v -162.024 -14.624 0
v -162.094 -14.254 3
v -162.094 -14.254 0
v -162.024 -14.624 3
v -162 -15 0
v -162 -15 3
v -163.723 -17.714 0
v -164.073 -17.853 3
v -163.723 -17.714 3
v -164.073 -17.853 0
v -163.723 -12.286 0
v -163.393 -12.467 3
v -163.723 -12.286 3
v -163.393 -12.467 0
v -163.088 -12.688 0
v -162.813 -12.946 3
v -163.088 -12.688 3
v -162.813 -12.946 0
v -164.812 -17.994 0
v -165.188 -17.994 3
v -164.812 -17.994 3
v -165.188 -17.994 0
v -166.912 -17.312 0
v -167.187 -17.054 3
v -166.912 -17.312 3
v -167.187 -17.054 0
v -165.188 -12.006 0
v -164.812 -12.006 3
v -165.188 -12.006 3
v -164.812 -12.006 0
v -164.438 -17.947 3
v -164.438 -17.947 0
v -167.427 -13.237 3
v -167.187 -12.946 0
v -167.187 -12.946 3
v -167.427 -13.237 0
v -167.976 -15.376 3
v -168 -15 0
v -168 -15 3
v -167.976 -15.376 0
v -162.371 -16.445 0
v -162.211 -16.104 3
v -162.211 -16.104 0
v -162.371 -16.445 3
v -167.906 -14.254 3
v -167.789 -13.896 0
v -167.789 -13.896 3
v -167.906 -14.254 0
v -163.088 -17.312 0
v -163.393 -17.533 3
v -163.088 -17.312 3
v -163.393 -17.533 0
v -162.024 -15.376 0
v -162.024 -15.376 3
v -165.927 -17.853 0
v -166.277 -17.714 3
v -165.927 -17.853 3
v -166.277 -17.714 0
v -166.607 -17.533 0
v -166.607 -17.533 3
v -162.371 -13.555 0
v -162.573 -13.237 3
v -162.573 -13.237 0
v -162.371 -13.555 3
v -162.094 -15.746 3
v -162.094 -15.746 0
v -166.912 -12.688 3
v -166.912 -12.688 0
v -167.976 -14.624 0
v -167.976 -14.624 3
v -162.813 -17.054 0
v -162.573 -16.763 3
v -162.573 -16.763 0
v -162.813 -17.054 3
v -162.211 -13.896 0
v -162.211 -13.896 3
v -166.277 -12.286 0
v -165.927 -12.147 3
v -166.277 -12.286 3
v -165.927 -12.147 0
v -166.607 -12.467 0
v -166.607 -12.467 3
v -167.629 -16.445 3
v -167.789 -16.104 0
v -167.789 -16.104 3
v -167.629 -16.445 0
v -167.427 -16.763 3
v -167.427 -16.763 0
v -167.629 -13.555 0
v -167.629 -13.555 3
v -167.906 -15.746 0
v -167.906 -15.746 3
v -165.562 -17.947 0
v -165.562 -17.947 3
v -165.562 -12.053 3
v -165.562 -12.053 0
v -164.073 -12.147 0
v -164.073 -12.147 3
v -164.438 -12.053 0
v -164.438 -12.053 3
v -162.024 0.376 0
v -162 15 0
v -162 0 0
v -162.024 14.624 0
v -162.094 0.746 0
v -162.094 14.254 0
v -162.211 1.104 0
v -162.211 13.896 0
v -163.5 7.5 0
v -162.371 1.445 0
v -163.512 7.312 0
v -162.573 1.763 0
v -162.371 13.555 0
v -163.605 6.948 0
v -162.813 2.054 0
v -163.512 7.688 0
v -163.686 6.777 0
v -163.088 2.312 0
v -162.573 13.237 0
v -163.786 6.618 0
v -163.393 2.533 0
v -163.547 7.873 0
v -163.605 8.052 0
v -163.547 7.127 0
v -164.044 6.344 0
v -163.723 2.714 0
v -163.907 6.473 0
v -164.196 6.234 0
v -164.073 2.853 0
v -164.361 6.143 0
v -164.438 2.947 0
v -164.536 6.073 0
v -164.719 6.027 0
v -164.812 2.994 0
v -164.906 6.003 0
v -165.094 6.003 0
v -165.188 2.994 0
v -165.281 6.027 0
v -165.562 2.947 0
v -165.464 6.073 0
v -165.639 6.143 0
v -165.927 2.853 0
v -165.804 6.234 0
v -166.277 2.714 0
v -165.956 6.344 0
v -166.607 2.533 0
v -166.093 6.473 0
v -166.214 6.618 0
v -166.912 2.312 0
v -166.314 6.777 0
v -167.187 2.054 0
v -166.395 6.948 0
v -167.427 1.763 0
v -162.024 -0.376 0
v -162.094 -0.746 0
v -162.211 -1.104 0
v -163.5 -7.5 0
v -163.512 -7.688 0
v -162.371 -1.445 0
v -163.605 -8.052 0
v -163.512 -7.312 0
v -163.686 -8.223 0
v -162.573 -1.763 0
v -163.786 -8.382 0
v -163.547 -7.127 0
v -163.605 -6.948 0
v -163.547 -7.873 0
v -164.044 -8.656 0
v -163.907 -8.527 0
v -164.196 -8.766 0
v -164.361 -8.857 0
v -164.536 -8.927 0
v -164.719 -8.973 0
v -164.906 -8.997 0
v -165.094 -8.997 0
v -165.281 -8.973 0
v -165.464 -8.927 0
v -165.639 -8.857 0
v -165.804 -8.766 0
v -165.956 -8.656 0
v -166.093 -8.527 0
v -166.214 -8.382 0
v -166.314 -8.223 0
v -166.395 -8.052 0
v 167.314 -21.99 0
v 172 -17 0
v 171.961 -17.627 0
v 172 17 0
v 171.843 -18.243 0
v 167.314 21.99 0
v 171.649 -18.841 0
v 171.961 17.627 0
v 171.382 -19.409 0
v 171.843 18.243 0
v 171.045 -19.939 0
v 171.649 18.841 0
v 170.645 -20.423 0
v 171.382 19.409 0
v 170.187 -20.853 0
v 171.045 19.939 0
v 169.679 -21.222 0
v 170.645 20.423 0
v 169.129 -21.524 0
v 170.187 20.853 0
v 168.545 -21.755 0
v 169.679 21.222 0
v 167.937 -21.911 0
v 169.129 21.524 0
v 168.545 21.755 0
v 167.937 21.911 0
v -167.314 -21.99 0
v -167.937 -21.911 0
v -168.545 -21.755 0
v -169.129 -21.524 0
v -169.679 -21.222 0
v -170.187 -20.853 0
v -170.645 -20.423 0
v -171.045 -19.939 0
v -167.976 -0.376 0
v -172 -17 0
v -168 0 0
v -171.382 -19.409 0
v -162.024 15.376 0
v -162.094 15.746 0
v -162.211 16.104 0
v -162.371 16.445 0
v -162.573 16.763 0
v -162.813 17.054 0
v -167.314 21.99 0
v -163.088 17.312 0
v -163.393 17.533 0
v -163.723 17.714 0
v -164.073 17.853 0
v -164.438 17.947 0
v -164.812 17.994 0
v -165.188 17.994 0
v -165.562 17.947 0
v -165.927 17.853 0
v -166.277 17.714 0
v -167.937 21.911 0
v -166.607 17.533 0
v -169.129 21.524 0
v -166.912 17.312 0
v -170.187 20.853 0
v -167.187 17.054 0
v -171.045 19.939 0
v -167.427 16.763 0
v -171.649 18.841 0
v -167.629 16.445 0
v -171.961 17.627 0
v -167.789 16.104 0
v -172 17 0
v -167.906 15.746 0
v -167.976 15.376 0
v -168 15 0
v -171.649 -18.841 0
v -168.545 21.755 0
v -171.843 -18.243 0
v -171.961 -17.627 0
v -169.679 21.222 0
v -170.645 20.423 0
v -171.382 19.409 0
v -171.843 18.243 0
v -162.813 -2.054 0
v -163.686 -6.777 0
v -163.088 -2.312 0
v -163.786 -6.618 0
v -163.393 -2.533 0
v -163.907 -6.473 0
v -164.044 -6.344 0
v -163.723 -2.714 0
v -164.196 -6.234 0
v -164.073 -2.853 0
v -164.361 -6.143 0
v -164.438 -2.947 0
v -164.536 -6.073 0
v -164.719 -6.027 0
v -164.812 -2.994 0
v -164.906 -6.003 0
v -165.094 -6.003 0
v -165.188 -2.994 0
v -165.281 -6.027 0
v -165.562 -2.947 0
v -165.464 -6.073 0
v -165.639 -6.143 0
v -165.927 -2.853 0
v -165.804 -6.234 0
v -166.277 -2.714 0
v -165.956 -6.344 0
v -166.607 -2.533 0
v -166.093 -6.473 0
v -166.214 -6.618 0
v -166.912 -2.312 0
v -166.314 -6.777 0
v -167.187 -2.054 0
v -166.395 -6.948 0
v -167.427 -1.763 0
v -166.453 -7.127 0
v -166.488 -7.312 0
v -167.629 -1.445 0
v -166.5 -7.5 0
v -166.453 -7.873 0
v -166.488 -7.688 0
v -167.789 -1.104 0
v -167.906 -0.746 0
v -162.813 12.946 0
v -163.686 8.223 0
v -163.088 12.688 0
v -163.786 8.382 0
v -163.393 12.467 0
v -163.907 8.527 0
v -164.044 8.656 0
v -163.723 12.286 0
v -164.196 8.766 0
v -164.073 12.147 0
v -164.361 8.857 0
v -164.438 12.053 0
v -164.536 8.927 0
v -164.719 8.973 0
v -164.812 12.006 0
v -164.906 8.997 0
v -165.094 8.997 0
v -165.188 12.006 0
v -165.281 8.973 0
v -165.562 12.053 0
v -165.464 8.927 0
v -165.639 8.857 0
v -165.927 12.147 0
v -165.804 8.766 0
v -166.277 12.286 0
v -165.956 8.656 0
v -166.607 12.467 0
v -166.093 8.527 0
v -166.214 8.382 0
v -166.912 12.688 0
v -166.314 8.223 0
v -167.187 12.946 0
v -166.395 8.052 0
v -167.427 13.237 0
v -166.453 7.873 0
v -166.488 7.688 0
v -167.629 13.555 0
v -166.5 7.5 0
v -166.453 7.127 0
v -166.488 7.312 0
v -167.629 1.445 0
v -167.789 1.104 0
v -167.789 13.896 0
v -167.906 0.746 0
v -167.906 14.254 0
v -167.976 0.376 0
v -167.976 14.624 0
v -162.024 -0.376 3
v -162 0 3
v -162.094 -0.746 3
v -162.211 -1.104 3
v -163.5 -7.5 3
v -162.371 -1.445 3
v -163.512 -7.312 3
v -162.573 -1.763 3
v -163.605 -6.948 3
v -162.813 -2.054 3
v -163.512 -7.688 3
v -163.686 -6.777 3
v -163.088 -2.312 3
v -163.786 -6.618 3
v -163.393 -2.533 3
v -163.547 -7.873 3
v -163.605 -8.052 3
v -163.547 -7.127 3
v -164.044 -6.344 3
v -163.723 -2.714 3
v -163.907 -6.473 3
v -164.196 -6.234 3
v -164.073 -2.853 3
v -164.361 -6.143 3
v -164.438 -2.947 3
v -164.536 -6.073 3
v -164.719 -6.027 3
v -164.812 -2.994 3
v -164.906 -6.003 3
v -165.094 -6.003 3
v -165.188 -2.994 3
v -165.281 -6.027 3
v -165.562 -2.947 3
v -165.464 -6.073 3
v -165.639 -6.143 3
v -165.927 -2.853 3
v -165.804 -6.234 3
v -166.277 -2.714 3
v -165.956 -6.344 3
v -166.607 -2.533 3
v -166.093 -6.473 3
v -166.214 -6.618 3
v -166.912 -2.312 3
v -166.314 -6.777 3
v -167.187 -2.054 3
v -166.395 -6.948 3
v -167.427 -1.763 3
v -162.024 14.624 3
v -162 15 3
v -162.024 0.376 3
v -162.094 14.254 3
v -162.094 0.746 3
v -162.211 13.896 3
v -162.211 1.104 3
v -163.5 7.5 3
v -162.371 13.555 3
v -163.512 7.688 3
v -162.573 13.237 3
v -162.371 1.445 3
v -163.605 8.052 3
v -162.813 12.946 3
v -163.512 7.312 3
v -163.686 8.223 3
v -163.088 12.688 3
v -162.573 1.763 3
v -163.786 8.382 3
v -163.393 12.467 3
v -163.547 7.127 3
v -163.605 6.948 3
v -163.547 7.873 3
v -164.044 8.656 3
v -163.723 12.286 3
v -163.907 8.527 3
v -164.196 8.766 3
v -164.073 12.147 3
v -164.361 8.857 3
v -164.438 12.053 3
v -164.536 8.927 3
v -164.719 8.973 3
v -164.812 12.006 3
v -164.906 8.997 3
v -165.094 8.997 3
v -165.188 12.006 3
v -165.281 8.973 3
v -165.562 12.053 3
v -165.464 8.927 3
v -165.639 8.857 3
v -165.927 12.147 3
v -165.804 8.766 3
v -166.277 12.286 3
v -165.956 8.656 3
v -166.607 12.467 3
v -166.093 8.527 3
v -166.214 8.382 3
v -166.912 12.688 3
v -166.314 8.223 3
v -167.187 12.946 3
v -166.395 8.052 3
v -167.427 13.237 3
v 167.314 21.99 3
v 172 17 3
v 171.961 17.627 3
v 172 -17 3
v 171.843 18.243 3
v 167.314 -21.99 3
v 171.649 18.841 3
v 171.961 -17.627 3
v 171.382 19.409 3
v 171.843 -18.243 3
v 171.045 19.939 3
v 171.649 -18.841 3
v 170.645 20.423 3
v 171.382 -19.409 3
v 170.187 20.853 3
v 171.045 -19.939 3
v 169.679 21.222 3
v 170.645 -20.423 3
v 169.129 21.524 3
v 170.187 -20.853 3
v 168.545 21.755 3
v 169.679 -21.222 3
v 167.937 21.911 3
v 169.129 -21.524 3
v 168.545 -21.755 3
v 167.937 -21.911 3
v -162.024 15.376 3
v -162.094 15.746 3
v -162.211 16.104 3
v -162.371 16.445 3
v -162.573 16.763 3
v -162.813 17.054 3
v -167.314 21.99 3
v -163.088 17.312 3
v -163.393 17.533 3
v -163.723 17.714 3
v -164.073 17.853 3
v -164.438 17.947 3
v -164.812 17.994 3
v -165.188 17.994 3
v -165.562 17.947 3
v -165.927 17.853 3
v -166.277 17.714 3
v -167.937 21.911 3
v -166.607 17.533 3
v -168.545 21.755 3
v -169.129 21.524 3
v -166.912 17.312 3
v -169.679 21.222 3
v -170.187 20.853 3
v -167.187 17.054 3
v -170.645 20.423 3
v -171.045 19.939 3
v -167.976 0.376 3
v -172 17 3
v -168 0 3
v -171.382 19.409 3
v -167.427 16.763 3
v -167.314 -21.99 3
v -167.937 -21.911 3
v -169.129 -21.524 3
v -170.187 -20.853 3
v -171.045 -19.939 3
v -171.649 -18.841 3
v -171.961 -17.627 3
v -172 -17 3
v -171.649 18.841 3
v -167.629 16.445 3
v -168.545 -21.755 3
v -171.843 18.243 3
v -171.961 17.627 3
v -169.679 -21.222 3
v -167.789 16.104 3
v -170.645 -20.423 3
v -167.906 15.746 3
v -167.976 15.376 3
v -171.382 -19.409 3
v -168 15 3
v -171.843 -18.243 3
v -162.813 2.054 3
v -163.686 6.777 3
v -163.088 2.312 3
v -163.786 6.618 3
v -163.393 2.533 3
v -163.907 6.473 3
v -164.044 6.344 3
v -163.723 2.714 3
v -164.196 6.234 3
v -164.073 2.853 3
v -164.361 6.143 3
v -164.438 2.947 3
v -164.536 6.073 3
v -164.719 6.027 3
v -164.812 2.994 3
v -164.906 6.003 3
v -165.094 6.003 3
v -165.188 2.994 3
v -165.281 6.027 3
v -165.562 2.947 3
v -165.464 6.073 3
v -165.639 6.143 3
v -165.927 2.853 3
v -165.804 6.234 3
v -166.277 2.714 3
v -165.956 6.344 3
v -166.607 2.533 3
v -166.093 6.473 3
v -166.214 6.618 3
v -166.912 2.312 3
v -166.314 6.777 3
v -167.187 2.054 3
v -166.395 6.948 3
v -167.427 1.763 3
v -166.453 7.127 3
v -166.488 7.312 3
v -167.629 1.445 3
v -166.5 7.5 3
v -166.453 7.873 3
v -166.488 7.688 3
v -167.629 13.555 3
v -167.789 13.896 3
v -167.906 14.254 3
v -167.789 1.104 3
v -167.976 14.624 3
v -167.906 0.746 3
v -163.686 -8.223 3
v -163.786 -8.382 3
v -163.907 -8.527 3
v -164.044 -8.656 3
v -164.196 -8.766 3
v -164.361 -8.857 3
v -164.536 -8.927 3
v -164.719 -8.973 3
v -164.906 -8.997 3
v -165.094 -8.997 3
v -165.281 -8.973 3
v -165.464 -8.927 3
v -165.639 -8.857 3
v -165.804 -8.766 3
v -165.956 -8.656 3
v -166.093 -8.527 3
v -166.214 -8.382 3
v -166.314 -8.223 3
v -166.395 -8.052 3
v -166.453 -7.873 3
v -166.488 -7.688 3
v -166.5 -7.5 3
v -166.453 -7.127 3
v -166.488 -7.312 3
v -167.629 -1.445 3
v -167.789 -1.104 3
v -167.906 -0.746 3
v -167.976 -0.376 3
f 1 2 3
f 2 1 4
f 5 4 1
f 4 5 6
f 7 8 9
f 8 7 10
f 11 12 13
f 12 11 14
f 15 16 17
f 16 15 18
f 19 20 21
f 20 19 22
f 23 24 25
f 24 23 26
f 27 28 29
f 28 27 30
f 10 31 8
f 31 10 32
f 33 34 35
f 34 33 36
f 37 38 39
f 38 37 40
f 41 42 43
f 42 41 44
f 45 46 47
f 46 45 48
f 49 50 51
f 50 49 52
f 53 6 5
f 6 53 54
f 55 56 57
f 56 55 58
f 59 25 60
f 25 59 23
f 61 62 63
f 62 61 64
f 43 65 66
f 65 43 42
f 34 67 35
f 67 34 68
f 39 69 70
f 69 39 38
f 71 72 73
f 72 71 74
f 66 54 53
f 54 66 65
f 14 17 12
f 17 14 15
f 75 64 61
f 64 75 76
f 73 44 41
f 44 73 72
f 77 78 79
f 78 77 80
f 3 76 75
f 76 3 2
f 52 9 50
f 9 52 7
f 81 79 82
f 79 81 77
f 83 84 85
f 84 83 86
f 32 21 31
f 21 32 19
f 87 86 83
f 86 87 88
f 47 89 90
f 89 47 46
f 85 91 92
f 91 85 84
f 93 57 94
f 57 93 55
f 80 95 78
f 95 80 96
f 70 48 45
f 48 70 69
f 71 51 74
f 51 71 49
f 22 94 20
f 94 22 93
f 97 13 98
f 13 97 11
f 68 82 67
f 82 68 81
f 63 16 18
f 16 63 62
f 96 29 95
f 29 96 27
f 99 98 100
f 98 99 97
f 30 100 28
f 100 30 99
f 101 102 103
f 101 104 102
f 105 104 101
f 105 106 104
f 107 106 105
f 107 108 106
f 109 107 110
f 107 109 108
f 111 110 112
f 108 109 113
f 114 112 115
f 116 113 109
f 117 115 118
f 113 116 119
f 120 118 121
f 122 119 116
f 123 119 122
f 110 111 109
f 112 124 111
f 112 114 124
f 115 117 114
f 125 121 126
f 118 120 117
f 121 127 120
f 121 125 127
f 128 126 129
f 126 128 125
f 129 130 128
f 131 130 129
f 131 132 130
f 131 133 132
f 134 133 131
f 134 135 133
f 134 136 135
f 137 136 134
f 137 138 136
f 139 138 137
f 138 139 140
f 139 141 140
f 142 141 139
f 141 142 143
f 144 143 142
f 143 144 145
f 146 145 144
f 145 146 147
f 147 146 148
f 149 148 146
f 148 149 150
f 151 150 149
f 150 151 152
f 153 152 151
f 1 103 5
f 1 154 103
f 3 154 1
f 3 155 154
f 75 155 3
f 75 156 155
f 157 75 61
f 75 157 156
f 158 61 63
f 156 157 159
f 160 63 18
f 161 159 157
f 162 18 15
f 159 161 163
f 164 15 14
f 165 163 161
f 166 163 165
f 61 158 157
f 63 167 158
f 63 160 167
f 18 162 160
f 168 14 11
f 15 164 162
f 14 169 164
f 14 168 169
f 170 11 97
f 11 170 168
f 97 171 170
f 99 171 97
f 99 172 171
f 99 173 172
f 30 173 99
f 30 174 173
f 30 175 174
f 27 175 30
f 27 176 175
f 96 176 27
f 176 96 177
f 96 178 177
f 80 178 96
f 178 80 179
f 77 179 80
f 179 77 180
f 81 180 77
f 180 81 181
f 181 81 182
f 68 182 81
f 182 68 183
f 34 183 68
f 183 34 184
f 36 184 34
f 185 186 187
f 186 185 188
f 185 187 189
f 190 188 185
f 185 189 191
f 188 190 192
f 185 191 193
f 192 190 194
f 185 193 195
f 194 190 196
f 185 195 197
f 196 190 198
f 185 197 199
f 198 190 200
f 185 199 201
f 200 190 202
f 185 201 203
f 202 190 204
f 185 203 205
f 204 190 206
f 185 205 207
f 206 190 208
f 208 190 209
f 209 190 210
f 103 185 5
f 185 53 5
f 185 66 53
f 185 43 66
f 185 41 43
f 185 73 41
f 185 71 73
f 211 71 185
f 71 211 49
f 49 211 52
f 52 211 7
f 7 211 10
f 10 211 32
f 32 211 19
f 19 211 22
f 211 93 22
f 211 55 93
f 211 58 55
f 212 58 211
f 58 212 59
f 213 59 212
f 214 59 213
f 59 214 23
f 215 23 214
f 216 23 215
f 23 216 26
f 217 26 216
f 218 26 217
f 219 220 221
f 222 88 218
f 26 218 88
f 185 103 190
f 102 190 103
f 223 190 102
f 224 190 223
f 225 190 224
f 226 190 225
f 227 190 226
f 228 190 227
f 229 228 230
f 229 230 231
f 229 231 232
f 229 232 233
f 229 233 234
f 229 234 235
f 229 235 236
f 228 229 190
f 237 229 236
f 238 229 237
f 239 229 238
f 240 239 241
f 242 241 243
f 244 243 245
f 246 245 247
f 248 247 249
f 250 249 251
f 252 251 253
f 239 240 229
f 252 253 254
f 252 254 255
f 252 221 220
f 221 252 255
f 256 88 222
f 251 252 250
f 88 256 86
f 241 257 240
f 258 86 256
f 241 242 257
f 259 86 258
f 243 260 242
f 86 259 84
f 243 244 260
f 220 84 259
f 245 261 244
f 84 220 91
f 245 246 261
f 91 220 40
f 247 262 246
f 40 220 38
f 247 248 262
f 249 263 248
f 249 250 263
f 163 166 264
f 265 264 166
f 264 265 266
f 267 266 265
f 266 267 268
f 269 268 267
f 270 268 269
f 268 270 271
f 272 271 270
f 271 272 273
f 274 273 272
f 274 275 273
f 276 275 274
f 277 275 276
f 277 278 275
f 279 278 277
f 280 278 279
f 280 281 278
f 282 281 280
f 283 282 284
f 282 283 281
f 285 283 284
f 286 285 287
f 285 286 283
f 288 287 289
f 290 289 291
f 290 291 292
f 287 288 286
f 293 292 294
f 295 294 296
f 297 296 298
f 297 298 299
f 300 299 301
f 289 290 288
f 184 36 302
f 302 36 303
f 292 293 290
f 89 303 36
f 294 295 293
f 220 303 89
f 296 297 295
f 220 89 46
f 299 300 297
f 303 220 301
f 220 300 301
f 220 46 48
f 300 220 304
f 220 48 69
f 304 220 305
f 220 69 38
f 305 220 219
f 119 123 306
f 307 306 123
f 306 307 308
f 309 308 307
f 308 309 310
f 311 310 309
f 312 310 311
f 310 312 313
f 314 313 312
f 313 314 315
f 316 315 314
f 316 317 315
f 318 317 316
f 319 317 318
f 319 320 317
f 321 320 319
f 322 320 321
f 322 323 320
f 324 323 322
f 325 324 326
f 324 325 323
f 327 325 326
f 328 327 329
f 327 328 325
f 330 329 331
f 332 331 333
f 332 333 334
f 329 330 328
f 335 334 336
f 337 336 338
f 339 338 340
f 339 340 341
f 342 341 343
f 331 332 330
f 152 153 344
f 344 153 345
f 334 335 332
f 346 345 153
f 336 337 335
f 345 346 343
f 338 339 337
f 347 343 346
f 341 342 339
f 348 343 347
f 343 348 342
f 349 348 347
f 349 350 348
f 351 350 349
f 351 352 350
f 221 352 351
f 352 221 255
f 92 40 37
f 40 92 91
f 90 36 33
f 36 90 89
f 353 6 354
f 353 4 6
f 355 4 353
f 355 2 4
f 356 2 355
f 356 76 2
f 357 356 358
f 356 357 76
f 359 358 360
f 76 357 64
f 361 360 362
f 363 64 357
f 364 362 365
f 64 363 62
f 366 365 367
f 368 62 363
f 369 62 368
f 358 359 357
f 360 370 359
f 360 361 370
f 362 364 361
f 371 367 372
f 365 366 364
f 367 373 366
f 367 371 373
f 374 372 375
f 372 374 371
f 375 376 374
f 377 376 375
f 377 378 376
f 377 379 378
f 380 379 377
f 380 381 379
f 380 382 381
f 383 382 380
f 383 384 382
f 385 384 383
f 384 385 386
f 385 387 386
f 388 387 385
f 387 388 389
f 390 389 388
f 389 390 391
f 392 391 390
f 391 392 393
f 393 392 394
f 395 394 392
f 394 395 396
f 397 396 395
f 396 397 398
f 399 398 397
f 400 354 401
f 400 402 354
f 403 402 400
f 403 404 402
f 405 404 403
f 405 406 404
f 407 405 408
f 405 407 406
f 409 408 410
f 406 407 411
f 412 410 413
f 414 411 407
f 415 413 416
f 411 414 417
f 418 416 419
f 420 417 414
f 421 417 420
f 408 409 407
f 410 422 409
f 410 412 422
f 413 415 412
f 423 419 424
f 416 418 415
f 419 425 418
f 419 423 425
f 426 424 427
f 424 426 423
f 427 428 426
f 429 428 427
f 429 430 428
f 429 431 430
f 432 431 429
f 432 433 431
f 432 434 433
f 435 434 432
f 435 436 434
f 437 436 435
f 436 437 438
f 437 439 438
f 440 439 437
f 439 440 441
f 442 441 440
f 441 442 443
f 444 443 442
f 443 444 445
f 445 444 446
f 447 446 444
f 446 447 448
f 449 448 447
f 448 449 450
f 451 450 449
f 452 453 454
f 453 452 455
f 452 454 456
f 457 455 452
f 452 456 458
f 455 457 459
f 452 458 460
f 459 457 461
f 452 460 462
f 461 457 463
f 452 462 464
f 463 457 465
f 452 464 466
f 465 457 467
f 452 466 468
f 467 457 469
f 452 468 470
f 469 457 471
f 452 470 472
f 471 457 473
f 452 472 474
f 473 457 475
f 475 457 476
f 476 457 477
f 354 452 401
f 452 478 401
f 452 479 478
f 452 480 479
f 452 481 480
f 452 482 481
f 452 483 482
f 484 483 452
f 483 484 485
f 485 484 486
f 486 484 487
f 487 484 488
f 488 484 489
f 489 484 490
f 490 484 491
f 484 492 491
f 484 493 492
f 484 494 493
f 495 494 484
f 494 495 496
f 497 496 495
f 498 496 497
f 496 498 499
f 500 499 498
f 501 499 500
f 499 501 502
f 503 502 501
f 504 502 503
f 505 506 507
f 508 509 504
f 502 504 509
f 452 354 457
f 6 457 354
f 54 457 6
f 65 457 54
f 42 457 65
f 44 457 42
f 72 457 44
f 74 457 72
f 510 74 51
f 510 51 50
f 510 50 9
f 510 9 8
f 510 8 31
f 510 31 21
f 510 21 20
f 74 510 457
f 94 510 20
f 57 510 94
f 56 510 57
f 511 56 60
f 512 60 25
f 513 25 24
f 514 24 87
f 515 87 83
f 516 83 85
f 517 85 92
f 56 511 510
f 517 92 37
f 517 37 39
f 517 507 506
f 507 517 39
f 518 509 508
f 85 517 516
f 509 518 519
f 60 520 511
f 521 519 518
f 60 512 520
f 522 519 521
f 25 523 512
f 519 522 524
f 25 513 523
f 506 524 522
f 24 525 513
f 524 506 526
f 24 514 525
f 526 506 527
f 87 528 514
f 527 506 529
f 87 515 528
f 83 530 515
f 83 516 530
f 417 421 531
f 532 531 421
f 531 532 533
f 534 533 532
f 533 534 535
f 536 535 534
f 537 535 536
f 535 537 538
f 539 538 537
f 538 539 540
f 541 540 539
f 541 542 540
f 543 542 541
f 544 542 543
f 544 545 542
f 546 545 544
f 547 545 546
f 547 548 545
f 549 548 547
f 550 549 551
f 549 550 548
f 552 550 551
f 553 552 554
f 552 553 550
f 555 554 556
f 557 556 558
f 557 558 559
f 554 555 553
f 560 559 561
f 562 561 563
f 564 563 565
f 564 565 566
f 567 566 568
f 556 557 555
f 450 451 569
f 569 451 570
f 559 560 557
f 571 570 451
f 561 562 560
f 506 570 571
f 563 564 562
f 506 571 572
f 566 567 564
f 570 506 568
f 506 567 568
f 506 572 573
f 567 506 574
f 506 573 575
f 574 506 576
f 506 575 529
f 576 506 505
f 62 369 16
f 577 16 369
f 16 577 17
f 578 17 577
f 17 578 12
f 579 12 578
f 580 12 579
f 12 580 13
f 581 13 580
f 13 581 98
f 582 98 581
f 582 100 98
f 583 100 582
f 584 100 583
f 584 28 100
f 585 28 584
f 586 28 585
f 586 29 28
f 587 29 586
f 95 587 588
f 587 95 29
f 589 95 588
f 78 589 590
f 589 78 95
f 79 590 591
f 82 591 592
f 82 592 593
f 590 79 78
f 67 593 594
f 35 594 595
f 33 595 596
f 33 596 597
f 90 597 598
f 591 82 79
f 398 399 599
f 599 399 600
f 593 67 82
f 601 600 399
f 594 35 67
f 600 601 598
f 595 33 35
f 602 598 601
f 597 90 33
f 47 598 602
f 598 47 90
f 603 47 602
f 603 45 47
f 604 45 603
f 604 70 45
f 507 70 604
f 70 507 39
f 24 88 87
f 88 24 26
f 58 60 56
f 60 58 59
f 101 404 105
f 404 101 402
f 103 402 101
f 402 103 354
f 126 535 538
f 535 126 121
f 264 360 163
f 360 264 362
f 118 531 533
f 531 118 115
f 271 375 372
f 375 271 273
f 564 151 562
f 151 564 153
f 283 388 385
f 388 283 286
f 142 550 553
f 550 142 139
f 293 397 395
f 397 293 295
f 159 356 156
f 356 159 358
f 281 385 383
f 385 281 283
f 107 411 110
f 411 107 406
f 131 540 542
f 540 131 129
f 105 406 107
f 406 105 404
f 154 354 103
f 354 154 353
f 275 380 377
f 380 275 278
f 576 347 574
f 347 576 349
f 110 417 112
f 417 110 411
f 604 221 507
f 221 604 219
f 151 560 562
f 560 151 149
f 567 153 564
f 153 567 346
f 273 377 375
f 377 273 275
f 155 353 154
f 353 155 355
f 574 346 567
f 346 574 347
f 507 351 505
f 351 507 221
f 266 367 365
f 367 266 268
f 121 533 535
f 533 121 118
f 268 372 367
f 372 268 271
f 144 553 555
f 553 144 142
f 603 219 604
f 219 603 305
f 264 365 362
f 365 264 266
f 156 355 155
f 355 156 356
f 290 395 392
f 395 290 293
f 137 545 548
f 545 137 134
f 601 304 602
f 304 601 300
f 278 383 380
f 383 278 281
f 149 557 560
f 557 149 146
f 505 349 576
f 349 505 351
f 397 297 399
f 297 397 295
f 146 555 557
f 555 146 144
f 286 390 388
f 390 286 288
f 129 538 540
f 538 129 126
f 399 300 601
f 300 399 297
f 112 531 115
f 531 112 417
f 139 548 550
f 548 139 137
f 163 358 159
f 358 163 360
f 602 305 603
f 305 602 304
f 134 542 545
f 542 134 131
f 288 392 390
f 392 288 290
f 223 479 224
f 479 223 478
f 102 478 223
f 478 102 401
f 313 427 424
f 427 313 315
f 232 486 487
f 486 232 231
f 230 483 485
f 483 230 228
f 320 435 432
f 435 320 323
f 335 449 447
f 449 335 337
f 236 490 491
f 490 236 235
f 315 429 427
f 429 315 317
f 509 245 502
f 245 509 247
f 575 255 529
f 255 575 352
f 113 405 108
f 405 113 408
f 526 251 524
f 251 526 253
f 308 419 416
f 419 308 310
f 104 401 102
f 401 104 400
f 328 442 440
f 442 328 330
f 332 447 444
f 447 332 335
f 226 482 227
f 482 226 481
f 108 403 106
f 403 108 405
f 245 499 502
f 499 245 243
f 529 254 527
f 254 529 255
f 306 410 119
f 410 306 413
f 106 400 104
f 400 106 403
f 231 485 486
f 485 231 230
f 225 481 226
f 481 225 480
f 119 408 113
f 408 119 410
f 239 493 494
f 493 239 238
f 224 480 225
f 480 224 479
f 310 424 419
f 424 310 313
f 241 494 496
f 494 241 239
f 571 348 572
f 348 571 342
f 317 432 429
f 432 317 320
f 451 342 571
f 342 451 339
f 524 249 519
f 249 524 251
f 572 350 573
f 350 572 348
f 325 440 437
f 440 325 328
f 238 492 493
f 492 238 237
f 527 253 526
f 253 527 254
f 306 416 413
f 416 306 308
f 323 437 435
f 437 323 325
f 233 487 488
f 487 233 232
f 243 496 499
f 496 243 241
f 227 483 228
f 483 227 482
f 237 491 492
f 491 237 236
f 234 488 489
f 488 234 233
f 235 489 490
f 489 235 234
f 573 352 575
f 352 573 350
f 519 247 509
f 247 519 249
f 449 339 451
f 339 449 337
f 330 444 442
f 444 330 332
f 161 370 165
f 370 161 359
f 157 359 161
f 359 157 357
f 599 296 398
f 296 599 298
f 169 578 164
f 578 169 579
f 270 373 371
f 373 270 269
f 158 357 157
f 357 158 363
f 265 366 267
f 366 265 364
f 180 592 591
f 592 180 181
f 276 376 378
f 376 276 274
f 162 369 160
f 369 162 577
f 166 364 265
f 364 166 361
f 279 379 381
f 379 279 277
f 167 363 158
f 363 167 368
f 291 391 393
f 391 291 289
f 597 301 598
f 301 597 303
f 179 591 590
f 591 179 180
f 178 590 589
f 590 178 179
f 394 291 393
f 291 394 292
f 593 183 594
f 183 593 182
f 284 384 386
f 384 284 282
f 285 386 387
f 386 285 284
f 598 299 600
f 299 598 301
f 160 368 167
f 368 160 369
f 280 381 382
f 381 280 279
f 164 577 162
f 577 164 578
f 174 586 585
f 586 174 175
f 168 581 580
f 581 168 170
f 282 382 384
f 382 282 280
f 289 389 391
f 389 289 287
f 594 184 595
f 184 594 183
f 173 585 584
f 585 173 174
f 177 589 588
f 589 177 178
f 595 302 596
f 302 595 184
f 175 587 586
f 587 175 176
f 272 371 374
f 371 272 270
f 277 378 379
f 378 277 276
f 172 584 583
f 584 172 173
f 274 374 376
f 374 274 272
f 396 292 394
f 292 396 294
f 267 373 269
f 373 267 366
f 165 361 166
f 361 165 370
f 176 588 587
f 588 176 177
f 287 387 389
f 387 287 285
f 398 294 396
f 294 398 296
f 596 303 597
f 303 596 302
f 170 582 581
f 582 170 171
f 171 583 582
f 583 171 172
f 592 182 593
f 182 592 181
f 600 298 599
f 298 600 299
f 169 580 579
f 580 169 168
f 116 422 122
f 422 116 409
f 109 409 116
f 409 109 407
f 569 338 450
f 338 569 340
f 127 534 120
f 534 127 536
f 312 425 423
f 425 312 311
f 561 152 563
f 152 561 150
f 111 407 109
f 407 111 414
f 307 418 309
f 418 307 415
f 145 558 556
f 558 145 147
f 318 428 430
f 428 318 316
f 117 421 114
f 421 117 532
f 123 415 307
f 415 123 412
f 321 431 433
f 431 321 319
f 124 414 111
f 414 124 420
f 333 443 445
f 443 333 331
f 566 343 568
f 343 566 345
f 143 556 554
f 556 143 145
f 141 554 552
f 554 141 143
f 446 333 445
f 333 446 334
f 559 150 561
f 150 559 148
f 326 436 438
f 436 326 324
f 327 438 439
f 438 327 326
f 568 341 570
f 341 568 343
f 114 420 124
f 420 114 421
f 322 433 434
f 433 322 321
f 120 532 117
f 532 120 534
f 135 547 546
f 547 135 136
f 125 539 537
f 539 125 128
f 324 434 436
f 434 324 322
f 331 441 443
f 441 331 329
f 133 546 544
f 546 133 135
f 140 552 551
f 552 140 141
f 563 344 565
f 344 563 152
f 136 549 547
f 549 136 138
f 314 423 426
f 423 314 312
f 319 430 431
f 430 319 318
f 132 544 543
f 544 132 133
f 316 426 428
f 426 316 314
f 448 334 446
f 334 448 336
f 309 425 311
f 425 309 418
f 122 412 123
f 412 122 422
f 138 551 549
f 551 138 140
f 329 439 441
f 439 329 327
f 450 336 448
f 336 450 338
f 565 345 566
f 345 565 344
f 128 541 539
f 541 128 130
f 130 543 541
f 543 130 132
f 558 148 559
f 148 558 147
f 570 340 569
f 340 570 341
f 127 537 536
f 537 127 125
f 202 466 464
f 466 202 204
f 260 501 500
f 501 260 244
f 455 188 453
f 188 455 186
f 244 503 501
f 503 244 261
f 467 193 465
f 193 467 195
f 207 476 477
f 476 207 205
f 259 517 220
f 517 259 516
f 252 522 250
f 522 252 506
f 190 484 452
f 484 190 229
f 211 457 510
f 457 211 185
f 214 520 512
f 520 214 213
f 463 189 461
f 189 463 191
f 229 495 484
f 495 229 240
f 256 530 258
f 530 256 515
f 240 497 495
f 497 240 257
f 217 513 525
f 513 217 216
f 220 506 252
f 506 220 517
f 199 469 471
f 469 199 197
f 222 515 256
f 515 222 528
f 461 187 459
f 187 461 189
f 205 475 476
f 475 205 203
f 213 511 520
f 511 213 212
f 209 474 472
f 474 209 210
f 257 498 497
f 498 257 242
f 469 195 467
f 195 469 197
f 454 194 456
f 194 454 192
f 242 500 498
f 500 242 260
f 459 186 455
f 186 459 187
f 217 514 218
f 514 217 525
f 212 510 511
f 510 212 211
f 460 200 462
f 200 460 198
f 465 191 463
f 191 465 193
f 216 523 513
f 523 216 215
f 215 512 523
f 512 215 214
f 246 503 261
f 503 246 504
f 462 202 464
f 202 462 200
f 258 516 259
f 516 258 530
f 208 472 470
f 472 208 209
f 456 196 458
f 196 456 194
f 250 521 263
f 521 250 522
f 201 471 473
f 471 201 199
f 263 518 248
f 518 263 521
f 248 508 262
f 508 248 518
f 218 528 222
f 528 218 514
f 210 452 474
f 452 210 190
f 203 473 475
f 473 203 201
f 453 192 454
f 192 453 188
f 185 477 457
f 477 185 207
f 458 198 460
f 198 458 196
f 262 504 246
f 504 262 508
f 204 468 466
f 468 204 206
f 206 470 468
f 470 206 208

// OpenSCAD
$fn = 50;


difference() {
	union() {
		hull() {
			translate(v = [-167.0000000000, 17.0000000000, 0]) {
				cylinder(h = 3, r = 5);
			}
			translate(v = [167.0000000000, 17.0000000000, 0]) {
				cylinder(h = 3, r = 5);
			}
			translate(v = [-167.0000000000, -17.0000000000, 0]) {
				cylinder(h = 3, r = 5);
			}
			translate(v = [167.0000000000, -17.0000000000, 0]) {
				cylinder(h = 3, r = 5);
			}
		}
	}
	union() {
		translate(v = [-165.0000000000, -15.0000000000, 0]) {
			cylinder(h = 3, r = 3.0000000000);
		}
		translate(v = [-165.0000000000, 0.0000000000, 0]) {
			cylinder(h = 3, r = 3.0000000000);
		}
		translate(v = [-165.0000000000, 15.0000000000, 0]) {
			cylinder(h = 3, r = 3.0000000000);
		}
		translate(v = [-165.0000000000, -15.0000000000, 0]) {
			cylinder(h = 3, r = 1.5000000000);
		}
		translate(v = [-165.0000000000, -7.5000000000, 0]) {
			cylinder(h = 3, r = 1.5000000000);
		}
		translate(v = [-165.0000000000, 0.0000000000, 0]) {
			cylinder(h = 3, r = 1.5000000000);
		}
		translate(v = [-165.0000000000, 7.5000000000, 0]) {
			cylinder(h = 3, r = 1.5000000000);
		}
		translate(v = [-165.0000000000, 15.0000000000, 0]) {
			cylinder(h = 3, r = 1.5000000000);
		}
		translate(v = [-165.0000000000, -15.0000000000, 0]) {
			cylinder(h = 3, r = 1.5000000000);
		}
		translate(v = [-165.0000000000, -7.5000000000, 0]) {
			cylinder(h = 3, r = 1.5000000000);
		}
		translate(v = [-165.0000000000, 0.0000000000, 0]) {
			cylinder(h = 3, r = 1.5000000000);
		}
		translate(v = [-165.0000000000, 7.5000000000, 0]) {
			cylinder(h = 3, r = 1.5000000000);
		}
		translate(v = [-165.0000000000, 15.0000000000, 0]) {
			cylinder(h = 3, r = 1.5000000000);
		}
		translate(v = [-165.0000000000, -15.0000000000, 0]) {
			cylinder(h = 3, r = 1.5000000000);
		}
		translate(v = [-165.0000000000, -7.5000000000, 0]) {
			cylinder(h = 3, r = 1.5000000000);
		}
		translate(v = [-165.0000000000, 0.0000000000, 0]) {
			cylinder(h = 3, r = 1.5000000000);
		}
		translate(v = [-165.0000000000, 7.5000000000, 0]) {
			cylinder(h = 3, r = 1.5000000000);
		}
		translate(v = [-165.0000000000, 15.0000000000, 0]) {
			cylinder(h = 3, r = 1.5000000000);
		}
	}
}
